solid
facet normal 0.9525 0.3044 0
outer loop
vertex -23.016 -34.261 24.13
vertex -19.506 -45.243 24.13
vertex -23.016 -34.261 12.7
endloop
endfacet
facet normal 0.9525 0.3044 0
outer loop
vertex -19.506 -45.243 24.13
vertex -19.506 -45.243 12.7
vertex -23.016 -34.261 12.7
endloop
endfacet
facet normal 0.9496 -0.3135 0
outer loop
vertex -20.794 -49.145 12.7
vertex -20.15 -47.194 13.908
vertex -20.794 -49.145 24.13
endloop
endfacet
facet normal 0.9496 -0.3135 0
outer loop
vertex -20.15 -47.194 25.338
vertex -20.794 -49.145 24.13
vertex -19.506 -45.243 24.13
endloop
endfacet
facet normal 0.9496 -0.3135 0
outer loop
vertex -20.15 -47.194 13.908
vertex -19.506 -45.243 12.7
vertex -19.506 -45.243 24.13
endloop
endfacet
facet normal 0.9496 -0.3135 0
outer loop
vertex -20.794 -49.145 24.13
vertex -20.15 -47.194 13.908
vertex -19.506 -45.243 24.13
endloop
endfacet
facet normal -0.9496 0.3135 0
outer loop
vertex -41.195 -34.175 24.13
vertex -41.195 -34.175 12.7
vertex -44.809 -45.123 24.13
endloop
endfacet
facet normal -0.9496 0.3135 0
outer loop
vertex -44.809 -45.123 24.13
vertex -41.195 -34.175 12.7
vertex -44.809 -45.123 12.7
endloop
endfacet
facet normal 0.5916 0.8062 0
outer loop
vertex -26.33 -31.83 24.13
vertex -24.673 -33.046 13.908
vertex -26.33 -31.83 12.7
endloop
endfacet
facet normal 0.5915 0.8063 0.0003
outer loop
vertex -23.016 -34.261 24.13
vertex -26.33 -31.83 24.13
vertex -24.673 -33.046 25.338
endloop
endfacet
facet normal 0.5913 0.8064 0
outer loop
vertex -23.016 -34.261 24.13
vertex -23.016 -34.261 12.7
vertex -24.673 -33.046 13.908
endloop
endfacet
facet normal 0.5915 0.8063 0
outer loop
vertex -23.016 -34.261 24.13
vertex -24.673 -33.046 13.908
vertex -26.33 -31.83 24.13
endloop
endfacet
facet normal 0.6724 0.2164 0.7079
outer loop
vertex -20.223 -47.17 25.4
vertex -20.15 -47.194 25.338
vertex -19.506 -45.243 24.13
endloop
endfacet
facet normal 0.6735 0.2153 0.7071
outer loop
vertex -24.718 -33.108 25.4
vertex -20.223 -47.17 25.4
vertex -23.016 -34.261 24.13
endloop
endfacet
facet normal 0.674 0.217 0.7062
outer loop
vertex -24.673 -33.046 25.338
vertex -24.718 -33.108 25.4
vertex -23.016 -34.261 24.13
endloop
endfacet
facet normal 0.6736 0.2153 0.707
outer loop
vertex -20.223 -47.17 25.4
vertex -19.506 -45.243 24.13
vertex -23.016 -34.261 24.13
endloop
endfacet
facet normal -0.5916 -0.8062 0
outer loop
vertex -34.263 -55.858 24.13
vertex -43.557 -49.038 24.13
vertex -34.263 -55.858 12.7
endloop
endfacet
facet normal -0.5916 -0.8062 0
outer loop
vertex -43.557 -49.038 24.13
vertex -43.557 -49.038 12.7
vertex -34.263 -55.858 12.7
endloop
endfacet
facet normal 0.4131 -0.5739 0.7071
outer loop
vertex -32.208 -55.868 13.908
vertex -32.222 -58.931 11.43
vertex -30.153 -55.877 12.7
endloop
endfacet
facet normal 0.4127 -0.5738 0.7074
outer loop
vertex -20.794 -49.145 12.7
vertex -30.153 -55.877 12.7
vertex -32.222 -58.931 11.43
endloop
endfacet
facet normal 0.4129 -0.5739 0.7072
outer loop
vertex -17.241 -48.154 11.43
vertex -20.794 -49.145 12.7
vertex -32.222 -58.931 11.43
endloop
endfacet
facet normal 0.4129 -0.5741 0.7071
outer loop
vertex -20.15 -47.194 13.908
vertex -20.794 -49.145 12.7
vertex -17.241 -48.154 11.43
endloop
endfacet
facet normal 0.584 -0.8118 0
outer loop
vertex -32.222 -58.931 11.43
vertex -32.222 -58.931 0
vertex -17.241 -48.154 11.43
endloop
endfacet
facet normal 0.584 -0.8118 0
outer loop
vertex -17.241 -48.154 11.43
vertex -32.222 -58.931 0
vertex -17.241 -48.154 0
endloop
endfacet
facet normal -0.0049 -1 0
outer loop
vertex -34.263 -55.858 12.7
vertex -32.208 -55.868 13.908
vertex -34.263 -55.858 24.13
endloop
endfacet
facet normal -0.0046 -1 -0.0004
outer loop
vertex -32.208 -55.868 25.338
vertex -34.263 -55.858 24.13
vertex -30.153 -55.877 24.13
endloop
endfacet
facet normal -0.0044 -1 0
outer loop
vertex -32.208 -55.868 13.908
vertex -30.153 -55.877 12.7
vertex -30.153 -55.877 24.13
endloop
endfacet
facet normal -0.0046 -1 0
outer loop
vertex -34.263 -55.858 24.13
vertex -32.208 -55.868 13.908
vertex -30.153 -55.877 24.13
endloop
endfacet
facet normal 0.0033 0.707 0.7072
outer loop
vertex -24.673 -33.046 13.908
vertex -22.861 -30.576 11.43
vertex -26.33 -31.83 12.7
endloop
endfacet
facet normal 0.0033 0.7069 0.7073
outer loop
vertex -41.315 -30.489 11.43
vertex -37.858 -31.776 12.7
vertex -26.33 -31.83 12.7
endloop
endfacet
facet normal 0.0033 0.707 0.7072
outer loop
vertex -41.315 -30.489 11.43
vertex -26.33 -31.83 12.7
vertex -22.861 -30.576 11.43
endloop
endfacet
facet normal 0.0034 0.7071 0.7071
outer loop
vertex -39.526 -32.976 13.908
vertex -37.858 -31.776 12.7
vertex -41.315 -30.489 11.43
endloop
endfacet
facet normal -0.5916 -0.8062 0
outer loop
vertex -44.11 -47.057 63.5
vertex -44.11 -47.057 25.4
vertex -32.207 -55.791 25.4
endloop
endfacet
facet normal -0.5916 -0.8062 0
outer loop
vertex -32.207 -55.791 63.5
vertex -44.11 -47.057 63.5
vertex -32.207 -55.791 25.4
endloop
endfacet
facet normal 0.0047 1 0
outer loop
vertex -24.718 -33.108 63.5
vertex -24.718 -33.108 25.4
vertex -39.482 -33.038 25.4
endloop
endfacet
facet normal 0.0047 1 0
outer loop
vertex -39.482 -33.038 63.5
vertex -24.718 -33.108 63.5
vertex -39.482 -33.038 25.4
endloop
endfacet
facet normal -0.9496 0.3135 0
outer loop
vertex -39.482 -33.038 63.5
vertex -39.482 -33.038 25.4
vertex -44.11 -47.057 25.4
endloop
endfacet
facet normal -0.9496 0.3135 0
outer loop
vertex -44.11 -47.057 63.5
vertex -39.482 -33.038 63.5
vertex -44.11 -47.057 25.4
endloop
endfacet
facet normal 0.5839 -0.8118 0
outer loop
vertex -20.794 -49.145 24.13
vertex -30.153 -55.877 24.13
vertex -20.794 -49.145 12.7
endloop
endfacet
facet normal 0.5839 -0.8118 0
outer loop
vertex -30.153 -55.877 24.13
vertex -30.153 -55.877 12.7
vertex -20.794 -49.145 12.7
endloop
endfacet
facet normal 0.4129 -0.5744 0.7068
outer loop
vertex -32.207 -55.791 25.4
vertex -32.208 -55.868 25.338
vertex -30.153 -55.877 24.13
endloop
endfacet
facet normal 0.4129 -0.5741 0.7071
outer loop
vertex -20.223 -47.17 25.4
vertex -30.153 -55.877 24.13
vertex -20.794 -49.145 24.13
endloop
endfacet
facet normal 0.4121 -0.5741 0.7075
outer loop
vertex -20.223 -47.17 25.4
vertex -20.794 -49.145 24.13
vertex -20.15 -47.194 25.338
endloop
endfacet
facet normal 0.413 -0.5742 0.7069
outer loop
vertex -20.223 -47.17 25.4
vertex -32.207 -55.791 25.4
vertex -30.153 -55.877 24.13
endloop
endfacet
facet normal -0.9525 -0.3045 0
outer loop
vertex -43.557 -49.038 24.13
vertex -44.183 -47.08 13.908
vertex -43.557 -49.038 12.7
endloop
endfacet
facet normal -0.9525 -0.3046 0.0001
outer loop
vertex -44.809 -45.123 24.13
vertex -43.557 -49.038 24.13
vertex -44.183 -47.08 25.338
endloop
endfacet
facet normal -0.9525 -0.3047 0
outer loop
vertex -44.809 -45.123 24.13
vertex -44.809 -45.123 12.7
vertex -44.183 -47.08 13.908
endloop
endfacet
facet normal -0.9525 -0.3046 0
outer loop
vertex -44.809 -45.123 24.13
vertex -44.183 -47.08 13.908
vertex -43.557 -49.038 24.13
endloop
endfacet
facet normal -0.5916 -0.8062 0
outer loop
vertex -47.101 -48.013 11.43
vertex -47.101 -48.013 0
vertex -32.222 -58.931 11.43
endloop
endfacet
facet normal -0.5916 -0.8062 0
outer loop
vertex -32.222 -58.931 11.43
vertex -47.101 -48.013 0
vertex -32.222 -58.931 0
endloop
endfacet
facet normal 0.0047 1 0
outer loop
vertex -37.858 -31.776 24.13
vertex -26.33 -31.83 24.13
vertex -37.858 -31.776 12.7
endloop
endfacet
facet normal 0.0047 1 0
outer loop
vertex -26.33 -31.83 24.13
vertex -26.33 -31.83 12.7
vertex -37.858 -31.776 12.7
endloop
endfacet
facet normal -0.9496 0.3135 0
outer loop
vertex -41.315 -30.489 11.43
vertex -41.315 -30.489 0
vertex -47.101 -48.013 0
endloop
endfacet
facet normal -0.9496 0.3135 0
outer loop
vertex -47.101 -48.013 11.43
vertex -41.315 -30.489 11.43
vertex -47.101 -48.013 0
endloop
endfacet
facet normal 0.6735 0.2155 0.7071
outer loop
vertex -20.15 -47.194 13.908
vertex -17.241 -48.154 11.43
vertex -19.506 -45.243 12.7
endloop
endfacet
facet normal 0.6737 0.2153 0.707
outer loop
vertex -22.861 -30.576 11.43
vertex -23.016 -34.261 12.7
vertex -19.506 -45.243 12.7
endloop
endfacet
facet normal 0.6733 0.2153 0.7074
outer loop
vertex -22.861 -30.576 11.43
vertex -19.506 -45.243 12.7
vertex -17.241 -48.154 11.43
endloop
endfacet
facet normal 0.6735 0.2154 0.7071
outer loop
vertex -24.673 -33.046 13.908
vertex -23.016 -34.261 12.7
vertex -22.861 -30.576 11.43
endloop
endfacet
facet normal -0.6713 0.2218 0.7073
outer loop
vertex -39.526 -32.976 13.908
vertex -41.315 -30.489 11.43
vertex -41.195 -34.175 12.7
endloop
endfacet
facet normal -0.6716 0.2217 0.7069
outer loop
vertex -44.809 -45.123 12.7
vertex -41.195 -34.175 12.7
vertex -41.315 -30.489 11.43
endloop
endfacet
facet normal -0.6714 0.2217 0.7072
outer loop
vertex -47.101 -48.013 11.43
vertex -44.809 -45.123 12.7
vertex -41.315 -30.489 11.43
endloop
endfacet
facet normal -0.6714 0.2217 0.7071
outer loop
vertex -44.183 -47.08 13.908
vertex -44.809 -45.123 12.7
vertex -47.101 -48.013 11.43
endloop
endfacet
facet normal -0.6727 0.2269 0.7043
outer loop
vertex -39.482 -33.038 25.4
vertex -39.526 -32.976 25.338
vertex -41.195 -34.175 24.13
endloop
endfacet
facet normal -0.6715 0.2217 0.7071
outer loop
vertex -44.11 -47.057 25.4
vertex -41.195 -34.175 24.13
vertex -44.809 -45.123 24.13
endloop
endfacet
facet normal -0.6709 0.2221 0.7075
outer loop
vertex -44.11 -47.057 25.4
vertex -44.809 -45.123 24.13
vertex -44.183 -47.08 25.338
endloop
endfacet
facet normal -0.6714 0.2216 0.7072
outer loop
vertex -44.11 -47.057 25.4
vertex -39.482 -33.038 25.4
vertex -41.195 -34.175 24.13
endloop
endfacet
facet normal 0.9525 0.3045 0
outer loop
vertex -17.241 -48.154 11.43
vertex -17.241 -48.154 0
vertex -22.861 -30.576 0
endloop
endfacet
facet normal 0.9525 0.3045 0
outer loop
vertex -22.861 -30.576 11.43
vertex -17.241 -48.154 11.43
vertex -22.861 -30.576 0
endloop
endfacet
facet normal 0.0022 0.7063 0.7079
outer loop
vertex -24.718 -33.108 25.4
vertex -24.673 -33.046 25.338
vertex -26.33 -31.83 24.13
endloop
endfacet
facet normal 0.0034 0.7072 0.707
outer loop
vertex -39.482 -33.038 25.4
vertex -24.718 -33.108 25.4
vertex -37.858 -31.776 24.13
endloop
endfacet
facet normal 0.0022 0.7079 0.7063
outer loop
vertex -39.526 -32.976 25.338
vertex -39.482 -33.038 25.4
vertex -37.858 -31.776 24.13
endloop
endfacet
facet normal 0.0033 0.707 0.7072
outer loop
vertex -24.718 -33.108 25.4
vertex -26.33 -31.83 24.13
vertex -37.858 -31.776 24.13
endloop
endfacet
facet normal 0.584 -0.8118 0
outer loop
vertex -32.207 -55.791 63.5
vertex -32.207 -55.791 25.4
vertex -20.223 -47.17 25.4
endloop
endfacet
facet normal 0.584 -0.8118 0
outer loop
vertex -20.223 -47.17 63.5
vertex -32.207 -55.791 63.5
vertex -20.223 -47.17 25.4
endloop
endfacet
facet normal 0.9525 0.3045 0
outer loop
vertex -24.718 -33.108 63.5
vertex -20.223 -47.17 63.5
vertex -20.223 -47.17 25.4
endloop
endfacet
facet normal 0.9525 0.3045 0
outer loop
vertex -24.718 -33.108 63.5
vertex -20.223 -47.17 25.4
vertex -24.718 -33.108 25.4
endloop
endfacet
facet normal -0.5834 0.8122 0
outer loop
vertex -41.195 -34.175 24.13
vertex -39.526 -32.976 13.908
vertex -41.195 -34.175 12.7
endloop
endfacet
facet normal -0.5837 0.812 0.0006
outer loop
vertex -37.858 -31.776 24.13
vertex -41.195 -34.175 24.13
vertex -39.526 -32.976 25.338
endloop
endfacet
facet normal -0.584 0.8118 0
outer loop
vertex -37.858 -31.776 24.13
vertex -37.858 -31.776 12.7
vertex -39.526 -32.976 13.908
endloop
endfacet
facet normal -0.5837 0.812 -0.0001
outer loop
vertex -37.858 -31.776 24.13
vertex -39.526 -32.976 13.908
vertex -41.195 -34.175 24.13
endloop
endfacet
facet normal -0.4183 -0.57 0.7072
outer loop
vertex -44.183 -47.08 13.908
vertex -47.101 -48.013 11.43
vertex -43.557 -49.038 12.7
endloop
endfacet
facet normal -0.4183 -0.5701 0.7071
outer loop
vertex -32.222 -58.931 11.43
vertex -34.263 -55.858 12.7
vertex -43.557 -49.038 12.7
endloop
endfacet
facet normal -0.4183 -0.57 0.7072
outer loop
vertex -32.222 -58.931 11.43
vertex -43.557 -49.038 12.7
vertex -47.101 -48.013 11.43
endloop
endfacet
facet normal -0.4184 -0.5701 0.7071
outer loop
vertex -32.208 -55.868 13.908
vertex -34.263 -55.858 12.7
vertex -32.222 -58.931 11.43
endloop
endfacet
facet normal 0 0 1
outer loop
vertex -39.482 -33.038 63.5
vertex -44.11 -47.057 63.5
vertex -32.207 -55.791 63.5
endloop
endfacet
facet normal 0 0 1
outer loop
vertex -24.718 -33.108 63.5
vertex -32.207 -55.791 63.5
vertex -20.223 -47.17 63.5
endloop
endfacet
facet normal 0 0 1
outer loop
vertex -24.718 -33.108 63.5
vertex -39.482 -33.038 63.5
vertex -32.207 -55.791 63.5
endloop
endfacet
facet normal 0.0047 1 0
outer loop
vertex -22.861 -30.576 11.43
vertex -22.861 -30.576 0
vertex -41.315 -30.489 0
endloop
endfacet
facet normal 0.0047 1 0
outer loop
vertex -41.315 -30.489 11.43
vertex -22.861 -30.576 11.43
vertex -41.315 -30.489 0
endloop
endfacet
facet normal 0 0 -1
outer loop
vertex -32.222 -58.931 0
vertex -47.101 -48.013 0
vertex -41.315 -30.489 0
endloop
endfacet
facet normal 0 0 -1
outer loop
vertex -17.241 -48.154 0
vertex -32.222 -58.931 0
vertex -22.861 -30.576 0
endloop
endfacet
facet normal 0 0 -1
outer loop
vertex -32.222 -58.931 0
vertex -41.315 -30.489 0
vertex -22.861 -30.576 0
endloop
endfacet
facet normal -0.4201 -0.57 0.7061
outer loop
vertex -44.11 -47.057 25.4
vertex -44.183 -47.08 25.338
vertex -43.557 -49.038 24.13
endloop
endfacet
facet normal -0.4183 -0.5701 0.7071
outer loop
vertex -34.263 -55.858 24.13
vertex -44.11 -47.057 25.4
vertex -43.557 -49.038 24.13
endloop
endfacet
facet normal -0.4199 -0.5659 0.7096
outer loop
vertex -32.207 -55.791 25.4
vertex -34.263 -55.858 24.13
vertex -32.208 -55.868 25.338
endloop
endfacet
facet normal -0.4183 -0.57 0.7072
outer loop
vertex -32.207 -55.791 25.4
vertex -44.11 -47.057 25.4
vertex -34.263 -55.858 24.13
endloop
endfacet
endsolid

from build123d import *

# Parameters (mm, degrees)
F1_DEPTH = 12.7
F2_SIZE  = 1.27
F3_DEPTH = 12.7
F4_SIZE  = 1.27
F5_DEPTH = 38.1
F6_SIZE  = 2.54


# Not quite as in the source:
# - two fillets or chamfers of one size are made in one step
# - a feature of the source that left no trace in its solid (it failed there, or was rolled back) is left out


with BuildPart() as f1:
    # F0 (on Top) → F1 (new body)
    with BuildSketch(Plane.XY):
        Polygon((-32.2221838869, -58.9305205708), (-17.2413629738, -48.1540753293), (-22.8610431915, -30.5763632619), (-41.315017485, -30.4891850014), (-47.1005206082, -48.0130179407), align=None)
    extrude(amount=F1_DEPTH)

    # F2
    f2_edges = [f1.edges().sort_by_distance(p)[0] for p in [
        (-39.661352, -53.471769, 12.7),
        (-24.731773, -53.542298, 12.7),
        (-20.051203, -39.365219, 12.7),
        (-32.08803, -30.532774, 12.7),
        (-44.207769, -39.251101, 12.7),
    ]]
    chamfer(f2_edges, length=F2_SIZE)

    # F3 (add): a face of the model
    f3_faces = [f1.faces().sort_by_distance(p)[0] for p in [
        (-32.1480256291, -43.2326324208, 12.7),
    ]]
    extrude(f3_faces, amount=F3_DEPTH)

    # F4
    f4_edges = [f1.edges().sort_by_distance(p)[0] for p in [
        (-38.91002, -52.447856, 25.4),
        (-43.001795, -39.649255, 25.4),
        (-25.473399, -52.511331, 25.4),
        (-32.09403, -31.80276, 25.4),
        (-21.260885, -39.751961, 25.4),
    ]]
    chamfer(f4_edges, length=F4_SIZE)

    # F5 (add): a face of the model
    f5_faces = [f1.faces().sort_by_distance(p)[0] for p in [
        (-32.1480256291, -43.2326324208, 25.4),
    ]]
    extrude(f5_faces, amount=F5_DEPTH)

    # F6
    f6_edges = [f1.edges().sort_by_distance(p)[0] for p in [
        (-45.605271, -47.534979, 18.415),
        (-32.214768, -57.360732, 18.415),
        (-40.398318, -31.76353, 18.415),
        (-18.732029, -47.661931, 18.415),
        (-23.789741, -31.84199, 18.415),
    ]]
    chamfer(f6_edges, length=F6_SIZE)


solid = f1.part
